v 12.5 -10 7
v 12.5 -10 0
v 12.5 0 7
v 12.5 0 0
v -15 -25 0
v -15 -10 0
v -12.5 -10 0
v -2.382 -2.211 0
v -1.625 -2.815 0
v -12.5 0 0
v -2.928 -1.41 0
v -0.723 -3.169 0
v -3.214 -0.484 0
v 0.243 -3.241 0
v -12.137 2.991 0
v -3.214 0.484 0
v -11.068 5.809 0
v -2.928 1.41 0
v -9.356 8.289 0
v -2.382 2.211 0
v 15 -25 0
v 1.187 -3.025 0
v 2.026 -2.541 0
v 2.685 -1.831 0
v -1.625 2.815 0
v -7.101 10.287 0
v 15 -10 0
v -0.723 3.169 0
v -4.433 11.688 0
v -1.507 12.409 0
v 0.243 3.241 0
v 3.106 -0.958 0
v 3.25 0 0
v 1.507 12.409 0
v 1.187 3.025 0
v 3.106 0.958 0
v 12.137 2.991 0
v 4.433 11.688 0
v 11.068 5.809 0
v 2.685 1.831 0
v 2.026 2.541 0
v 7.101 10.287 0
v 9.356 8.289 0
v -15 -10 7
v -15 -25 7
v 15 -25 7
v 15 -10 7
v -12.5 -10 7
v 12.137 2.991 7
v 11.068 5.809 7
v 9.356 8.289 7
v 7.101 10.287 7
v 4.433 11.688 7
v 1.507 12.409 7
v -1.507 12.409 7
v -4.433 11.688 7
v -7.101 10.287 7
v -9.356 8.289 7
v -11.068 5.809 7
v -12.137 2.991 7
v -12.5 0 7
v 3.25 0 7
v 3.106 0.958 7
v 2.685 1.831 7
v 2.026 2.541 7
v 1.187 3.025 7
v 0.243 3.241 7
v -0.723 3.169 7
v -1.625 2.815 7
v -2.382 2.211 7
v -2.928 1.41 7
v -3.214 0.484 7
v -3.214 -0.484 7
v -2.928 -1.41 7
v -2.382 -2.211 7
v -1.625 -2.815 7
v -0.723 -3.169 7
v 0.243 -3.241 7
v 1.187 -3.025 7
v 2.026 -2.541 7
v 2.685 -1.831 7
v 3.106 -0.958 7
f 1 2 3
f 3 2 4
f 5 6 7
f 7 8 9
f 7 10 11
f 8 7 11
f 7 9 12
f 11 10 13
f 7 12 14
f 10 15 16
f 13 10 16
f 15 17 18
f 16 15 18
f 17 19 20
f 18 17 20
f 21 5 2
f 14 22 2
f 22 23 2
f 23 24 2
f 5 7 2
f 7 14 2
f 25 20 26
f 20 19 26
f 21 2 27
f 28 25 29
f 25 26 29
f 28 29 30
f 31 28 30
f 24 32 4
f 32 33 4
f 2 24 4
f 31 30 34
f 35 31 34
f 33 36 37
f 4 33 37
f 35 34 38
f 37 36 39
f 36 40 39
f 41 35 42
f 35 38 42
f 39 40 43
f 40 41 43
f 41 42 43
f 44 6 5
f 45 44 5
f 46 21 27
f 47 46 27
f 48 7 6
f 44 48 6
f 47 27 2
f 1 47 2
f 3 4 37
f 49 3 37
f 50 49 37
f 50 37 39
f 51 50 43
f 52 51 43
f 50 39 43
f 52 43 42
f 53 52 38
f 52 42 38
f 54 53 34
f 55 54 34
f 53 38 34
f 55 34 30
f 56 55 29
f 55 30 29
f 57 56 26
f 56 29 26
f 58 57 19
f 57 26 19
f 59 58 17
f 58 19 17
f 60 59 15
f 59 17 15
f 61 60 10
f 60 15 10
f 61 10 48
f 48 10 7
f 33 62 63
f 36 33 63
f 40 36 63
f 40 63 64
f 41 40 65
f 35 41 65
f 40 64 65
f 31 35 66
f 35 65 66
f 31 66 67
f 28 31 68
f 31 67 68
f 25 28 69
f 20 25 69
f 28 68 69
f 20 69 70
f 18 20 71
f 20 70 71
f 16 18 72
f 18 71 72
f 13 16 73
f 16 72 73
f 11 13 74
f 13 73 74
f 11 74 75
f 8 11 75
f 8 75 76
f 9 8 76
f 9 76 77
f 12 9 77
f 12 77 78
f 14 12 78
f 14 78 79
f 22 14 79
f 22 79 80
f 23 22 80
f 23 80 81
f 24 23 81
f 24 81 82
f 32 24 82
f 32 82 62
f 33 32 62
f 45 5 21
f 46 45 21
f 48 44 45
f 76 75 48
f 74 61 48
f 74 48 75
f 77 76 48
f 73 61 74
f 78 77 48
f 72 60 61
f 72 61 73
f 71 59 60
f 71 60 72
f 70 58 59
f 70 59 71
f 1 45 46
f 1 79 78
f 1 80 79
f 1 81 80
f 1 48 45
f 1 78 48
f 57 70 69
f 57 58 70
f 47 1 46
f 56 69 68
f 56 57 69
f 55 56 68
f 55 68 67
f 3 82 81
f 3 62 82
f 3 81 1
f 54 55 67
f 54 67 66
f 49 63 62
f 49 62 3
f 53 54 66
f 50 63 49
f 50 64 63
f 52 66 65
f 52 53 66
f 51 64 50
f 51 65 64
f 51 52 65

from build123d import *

# Parameters (mm, degrees)
Y_KSEKLIK_EKSTR_ZYON1_DEPTH = 7
IZIM4_R                     = 3.25
KES_EKSTR_ZYON1_DEPTH       = 30.983328701


with BuildPart() as part:
    # Çizim1 → Yükseklik-Ekstrüzyon1 (new body)
    with BuildSketch(Plane.XY):
        with BuildLine():
            Line((-12.5, 0), (-12.5, -10))
            Line((-12.5, -10), (-15, -10))
            Line((-15, -10), (-15, -25))
            Line((-15, -25), (15, -25))
            Line((15, -25), (15, -10))
            Line((15, -10), (12.5, -10))
            Line((12.5, -10), (12.5, 0))
            ThreePointArc((12.5, 0), (0, 12.5), (-12.5, 0))
        make_face()
    extrude(amount=Y_KSEKLIK_EKSTR_ZYON1_DEPTH)

    # Çizim4 → Kes-Ekstrüzyon1 (cut, through all)
    with BuildSketch(Plane.XY.offset(7)):
        Circle(IZIM4_R)
    extrude(amount=-KES_EKSTR_ZYON1_DEPTH, mode=Mode.SUBTRACT)


solid = part.part
